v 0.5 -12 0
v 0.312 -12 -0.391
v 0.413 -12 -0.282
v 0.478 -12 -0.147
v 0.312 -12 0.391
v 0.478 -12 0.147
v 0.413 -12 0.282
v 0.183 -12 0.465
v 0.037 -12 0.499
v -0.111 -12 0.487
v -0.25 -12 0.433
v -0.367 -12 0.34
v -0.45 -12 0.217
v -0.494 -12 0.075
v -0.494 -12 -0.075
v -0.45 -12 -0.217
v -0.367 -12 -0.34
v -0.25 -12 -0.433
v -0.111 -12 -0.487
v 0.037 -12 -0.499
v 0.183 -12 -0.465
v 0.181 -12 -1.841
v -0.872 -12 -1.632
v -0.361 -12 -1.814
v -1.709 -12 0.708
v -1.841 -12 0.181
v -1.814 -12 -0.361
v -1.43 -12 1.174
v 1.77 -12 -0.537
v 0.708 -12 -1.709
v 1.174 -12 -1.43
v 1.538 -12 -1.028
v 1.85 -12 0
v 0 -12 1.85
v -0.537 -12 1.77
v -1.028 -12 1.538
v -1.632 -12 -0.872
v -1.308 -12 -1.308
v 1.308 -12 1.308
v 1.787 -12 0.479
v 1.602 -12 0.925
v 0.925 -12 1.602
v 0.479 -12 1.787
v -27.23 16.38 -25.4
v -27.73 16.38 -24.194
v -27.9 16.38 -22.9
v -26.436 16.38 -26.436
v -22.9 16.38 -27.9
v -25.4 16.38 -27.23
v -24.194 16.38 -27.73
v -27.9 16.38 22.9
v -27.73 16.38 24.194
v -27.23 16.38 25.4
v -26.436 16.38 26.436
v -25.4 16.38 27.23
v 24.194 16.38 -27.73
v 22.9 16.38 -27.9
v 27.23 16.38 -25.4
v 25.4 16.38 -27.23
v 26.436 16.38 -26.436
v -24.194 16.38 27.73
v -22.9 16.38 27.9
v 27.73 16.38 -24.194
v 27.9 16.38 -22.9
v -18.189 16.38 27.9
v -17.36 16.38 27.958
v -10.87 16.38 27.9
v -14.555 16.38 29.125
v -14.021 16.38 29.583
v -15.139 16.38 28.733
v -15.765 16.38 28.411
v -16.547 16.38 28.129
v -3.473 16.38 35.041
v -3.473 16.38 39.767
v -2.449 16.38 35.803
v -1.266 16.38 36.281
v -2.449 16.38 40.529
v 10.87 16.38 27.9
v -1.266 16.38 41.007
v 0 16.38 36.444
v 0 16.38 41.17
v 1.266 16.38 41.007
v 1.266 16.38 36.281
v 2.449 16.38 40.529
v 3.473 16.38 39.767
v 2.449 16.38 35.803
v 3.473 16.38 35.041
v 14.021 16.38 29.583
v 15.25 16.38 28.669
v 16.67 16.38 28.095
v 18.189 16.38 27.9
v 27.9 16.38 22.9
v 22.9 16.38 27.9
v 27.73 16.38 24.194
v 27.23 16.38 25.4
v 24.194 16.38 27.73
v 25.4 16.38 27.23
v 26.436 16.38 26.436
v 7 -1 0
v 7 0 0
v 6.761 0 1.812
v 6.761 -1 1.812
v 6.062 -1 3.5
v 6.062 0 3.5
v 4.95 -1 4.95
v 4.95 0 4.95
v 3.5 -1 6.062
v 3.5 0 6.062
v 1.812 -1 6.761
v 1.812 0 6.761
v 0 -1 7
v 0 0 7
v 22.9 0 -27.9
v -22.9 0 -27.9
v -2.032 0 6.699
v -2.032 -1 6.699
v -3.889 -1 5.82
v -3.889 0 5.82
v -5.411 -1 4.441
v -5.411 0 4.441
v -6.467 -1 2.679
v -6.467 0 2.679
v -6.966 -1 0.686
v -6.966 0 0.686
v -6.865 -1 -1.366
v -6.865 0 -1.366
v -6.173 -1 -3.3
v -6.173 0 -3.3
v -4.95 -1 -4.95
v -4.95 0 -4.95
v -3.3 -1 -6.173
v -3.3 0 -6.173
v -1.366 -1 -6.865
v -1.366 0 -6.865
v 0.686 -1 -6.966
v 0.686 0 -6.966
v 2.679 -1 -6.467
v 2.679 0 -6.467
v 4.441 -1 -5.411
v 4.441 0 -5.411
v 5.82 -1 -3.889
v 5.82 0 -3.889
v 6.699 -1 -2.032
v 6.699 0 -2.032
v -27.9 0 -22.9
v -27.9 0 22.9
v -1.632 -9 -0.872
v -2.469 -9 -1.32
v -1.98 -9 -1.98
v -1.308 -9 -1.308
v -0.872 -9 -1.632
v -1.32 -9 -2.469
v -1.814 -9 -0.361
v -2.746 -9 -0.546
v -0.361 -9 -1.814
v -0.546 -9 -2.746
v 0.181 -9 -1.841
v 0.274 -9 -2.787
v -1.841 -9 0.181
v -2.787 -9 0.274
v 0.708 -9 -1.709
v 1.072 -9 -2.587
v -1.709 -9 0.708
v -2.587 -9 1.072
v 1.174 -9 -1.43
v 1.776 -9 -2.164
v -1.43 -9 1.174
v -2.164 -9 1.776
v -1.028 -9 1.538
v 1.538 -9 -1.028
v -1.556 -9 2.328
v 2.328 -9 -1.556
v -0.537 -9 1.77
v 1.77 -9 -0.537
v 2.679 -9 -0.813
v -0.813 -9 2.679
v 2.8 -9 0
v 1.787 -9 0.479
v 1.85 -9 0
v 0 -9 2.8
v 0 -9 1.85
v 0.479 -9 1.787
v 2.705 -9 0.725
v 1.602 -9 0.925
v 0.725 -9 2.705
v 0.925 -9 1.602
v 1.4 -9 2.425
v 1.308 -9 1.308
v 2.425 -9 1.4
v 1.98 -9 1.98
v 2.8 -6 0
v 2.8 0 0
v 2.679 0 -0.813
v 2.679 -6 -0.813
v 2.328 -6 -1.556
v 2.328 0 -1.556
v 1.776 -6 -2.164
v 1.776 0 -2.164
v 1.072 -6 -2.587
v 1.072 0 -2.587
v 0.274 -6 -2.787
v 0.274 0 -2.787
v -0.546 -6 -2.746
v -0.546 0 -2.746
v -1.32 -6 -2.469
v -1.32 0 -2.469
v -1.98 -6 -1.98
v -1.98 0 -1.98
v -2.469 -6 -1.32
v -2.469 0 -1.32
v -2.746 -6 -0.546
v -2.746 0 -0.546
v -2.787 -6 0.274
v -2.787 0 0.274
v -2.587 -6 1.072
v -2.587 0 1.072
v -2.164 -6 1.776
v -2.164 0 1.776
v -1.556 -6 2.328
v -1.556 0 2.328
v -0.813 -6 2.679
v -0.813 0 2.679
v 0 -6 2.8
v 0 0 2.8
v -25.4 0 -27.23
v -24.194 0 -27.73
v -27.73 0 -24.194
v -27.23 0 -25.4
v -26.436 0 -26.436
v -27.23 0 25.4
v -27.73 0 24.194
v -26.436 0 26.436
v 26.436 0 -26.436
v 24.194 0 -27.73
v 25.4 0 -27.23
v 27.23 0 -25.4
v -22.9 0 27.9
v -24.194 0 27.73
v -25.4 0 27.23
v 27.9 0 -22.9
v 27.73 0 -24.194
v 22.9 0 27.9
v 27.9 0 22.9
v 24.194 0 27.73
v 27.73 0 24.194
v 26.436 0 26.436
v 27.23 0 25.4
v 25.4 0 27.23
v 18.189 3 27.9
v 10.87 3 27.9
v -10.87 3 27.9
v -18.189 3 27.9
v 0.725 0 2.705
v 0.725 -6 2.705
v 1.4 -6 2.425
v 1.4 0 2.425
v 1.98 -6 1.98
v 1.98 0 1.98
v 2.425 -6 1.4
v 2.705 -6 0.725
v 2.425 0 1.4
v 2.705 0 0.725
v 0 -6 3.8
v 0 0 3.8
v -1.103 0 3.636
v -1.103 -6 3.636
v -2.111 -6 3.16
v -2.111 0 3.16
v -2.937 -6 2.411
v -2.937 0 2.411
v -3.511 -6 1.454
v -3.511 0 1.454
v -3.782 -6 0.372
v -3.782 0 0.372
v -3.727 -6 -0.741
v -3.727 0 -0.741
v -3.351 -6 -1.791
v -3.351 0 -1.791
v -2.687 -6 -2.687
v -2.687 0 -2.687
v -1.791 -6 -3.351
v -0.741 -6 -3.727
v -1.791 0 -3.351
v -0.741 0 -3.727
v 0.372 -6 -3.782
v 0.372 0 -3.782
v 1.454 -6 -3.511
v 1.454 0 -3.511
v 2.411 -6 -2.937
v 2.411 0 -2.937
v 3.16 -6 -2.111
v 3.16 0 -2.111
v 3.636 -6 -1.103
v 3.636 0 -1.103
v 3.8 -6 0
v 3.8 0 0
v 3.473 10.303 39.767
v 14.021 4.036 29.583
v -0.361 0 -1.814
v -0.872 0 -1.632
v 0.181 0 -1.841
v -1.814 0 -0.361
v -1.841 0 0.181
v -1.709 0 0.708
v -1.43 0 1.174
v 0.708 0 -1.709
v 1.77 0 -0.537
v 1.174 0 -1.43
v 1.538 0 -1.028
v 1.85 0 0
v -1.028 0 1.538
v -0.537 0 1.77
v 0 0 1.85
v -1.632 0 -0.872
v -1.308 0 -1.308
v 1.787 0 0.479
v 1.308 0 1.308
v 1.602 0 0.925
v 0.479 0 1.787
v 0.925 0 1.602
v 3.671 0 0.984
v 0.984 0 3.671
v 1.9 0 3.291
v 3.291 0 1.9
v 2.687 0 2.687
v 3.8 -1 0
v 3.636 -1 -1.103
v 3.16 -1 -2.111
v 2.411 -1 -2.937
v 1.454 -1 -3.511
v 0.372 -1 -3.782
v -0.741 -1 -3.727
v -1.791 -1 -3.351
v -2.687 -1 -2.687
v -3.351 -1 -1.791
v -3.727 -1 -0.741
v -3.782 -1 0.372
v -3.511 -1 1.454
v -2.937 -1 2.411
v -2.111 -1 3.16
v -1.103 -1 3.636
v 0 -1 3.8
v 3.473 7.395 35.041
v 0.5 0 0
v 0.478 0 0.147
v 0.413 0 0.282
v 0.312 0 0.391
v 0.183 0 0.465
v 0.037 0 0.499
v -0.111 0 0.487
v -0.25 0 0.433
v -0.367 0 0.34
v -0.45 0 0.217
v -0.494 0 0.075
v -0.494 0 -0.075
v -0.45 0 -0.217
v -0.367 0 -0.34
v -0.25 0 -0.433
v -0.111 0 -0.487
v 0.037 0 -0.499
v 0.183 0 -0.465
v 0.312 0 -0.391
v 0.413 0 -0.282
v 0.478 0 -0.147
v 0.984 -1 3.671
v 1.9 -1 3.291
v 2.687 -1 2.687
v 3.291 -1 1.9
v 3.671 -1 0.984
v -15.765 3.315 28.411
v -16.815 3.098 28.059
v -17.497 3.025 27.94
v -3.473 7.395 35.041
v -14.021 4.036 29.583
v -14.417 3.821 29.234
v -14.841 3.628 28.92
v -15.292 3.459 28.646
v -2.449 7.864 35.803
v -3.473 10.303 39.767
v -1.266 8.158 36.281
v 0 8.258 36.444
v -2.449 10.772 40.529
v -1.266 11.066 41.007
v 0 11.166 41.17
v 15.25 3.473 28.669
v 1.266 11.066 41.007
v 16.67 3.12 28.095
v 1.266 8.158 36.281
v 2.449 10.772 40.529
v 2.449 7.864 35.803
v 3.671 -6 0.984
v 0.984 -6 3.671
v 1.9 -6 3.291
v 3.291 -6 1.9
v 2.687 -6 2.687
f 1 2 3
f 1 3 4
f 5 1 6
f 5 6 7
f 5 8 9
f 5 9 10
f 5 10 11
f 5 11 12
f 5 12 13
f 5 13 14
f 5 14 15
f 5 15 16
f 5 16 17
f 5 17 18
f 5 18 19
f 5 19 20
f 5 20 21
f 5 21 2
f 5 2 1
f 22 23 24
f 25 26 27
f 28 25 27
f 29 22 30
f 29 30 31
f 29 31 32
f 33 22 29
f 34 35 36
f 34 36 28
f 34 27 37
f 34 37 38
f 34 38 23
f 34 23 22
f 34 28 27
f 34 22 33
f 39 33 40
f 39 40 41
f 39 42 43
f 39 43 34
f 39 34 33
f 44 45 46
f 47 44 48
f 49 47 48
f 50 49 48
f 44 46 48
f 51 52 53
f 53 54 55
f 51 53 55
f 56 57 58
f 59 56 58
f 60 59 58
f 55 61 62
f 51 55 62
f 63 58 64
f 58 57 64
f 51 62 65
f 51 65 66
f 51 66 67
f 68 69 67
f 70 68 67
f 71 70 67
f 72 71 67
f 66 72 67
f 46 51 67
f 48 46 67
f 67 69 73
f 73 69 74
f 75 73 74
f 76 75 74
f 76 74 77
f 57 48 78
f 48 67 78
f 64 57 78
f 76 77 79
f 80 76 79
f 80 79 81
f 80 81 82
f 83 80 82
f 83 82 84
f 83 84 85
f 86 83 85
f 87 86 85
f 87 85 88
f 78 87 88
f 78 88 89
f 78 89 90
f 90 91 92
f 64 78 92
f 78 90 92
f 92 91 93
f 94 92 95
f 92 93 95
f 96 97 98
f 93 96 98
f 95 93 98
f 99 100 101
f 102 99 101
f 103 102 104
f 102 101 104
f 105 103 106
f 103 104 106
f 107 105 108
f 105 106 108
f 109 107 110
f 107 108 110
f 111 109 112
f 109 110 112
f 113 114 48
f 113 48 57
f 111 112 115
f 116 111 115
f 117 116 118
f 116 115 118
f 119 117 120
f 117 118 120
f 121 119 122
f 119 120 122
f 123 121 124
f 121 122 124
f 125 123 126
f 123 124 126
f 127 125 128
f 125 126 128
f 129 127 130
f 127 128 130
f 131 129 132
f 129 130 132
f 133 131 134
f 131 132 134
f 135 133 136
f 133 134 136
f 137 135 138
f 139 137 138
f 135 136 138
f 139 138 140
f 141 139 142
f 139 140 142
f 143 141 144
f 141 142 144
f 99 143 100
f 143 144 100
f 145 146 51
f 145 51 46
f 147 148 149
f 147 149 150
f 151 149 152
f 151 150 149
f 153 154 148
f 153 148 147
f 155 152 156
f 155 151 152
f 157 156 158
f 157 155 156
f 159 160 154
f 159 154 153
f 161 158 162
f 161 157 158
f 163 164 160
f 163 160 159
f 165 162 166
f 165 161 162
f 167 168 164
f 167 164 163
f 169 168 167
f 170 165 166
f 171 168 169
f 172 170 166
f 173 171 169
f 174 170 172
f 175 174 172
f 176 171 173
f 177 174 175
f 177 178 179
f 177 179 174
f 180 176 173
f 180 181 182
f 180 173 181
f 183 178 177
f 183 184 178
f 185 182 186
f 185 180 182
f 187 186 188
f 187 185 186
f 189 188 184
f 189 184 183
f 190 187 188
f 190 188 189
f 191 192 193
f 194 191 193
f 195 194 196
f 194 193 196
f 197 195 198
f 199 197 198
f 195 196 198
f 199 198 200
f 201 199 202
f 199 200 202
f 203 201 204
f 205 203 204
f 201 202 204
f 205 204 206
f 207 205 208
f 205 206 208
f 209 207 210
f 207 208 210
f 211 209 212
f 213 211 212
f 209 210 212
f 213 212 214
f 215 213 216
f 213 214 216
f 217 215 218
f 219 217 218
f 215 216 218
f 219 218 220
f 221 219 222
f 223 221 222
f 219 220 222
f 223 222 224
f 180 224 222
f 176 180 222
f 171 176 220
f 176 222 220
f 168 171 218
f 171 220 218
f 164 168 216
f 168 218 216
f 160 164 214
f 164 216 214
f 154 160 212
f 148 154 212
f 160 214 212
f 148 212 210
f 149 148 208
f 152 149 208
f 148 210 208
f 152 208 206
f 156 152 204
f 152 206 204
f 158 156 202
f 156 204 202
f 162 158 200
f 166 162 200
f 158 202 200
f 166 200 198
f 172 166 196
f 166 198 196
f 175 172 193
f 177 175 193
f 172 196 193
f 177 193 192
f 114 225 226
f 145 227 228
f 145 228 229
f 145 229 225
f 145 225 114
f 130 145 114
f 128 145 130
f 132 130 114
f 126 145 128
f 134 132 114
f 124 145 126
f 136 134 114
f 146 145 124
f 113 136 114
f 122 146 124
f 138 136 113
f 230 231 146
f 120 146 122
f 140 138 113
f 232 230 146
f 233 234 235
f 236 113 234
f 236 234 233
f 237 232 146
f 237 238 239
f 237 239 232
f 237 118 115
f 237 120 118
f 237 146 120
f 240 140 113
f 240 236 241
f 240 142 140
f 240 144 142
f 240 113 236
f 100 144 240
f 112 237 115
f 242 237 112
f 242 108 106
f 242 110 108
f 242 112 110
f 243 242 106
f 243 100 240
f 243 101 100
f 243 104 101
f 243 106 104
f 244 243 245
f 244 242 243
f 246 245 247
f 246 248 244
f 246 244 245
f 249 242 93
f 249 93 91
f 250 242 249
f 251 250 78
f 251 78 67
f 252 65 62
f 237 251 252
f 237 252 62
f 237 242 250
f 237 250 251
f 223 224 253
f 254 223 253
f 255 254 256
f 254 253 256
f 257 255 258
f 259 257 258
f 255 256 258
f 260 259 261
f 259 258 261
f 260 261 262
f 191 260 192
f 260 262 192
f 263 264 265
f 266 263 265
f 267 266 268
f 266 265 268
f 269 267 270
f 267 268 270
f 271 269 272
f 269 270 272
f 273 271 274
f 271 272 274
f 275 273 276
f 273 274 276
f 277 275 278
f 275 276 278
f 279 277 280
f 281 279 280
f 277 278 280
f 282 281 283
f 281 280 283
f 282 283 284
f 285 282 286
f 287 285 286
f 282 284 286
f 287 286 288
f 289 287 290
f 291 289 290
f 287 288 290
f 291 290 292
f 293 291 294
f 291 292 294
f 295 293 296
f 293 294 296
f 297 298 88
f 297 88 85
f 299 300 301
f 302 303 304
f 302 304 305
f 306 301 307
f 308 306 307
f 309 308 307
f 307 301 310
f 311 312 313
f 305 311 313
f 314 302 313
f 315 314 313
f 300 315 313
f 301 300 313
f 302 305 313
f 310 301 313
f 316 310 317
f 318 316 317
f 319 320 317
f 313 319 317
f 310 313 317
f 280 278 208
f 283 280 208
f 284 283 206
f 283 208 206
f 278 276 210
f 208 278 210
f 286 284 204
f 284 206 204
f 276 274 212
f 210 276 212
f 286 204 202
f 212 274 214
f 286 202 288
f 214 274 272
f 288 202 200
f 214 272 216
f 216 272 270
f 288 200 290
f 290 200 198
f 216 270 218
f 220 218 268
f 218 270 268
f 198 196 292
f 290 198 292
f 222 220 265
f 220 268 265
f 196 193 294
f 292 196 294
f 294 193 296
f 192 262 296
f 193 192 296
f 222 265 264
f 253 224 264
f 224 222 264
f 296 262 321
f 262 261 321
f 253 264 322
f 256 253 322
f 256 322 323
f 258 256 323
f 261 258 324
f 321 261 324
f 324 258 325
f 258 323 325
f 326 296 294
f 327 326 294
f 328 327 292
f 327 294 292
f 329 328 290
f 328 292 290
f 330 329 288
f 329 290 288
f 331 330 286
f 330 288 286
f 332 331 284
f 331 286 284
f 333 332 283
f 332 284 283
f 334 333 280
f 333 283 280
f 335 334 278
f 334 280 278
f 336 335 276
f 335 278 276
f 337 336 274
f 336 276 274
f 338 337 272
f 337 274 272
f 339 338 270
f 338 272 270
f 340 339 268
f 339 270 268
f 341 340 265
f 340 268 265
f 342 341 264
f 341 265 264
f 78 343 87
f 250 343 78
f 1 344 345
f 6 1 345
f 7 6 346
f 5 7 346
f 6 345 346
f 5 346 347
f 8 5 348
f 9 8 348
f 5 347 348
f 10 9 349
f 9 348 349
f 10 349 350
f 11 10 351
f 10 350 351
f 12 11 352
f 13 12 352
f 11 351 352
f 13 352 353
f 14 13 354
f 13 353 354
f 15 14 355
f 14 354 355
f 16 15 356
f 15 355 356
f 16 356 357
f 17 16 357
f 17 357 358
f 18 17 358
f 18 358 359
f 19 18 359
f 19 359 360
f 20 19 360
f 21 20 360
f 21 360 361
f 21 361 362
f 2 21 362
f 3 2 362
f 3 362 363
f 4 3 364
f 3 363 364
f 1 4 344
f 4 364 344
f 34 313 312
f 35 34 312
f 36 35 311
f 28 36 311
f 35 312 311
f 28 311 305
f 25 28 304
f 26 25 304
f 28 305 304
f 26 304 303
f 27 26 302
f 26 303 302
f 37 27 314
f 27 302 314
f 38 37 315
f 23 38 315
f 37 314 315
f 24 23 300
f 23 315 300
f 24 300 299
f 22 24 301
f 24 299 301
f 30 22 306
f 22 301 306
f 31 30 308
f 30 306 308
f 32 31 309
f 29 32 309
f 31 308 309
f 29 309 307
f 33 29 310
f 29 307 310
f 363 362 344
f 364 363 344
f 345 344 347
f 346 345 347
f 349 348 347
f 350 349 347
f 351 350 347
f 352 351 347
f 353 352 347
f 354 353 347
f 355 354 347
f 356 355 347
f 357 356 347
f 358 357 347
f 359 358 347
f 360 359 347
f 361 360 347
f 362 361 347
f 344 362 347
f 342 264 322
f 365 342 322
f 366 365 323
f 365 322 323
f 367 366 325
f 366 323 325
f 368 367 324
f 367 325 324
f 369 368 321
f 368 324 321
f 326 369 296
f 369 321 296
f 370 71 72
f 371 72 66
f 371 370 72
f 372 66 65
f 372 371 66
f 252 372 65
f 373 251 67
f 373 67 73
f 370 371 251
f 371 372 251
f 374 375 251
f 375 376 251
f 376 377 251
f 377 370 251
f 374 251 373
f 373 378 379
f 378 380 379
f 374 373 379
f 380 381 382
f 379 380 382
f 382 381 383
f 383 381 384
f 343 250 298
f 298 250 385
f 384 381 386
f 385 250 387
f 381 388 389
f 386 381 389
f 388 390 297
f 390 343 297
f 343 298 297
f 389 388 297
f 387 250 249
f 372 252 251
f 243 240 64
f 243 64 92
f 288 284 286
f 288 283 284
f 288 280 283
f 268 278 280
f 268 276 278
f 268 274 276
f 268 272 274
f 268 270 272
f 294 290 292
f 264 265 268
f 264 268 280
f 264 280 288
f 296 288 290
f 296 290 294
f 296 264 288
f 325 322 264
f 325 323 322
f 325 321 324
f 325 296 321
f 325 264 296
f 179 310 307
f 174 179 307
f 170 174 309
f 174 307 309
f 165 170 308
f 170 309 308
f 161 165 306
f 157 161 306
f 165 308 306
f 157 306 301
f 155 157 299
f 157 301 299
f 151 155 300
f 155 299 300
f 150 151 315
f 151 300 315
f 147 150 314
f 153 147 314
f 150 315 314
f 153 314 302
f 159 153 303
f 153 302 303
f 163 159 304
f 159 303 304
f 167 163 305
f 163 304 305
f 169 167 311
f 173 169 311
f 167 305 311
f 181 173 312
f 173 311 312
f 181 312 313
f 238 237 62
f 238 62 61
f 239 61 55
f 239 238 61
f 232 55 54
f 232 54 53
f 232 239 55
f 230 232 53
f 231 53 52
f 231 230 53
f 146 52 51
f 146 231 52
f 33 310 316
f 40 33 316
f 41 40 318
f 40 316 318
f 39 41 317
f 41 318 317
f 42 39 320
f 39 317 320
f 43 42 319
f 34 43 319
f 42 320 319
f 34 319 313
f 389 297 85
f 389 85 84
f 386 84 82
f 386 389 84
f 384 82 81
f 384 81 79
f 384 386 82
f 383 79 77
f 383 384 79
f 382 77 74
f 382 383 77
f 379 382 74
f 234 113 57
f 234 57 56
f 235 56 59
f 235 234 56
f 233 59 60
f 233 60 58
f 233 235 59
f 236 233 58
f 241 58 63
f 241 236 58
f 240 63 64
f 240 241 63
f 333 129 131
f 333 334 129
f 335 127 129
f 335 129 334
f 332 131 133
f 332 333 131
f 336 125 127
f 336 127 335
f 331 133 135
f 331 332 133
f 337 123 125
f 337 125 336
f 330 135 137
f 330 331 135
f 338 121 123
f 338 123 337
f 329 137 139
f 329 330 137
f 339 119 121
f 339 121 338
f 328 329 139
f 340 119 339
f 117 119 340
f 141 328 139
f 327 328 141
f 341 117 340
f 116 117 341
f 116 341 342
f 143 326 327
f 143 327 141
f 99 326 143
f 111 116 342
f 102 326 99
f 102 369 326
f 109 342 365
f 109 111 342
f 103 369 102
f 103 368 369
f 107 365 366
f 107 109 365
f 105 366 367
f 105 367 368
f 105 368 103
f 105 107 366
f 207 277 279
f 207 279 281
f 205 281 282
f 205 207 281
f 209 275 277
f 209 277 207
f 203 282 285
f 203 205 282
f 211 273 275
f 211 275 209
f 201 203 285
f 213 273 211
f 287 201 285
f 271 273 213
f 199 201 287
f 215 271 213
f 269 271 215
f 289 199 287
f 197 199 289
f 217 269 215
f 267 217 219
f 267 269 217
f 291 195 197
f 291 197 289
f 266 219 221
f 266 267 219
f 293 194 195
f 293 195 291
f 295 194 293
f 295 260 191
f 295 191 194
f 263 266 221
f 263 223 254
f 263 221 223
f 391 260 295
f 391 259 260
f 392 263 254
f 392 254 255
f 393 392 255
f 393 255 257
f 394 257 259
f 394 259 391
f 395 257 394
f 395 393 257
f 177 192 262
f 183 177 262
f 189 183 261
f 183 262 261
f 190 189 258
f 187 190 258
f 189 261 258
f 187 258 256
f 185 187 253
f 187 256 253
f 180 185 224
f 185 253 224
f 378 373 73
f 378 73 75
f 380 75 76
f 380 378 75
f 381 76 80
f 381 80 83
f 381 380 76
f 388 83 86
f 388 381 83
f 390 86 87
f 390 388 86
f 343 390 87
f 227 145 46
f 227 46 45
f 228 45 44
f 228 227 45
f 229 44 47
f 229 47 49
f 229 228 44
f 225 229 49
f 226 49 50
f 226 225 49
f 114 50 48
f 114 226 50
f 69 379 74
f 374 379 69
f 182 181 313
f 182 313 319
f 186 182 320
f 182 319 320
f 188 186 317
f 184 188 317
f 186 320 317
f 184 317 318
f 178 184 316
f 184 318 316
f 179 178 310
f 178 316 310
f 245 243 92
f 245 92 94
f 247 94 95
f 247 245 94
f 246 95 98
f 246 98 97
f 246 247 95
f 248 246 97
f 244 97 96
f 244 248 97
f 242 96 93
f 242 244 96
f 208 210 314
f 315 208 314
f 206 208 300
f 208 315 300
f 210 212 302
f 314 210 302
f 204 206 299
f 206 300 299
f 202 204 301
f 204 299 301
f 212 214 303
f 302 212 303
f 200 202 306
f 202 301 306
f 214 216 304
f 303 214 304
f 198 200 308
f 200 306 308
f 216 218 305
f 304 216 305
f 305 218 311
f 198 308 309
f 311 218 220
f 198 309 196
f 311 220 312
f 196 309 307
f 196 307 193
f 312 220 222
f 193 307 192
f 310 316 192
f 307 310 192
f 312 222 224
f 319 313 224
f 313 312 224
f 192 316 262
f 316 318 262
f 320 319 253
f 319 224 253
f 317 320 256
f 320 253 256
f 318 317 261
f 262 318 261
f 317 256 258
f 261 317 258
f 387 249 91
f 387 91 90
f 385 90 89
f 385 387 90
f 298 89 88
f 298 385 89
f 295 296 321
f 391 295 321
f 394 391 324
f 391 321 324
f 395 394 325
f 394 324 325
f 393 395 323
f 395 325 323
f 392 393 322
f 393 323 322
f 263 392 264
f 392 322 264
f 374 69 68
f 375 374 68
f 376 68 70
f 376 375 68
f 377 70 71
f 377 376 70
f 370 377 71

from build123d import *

# Parameters (mm, degrees)
F1_DEPTH  = 16.38
F4_DEPTH  = 55.801
F5_DEPTH  = 1
F6_DEPTH  = 6
F7_R      = 0.5
F8_DEPTH  = 12
F9_DEPTH  = 9
F10_DEPTH = 12


with BuildPart() as f1:
    # F0 (on Front) → F1 (new body)
    with BuildSketch(Plane.XZ):
        with BuildLine():
            Line((-22.9, -27.9), (22.9, -27.9))
            ThreePointArc((22.9, -27.9), (26.435534, -26.435534), (27.9, -22.9))
            Line((27.9, -22.9), (27.9, 22.9))
            ThreePointArc((27.9, 22.9), (26.435534, 26.435534), (22.9, 27.9))
            Line((22.9, 27.9), (18.18869, 27.9))
            ThreePointArc((18.18869, 27.9), (15.941423, 28.336746), (14.021318, 29.583403))
            Line((14.021318, 29.583403), (3.47281, 39.767246))
            ThreePointArc((3.47281, 39.767246), (0, 41.170082), (-3.47281, 39.767246))
            Line((-3.47281, 39.767246), (-14.021318, 29.583403))
            ThreePointArc((-14.021318, 29.583403), (-14.841456, 28.920439), (-15.765, 28.411309))
            ThreePointArc((-15.765, 28.411309), (-16.950172, 28.029219), (-18.18869, 27.9))
            Line((-18.18869, 27.9), (-22.9, 27.9))
            ThreePointArc((-22.9, 27.9), (-26.435534, 26.435534), (-27.9, 22.9))
            Line((-27.9, 22.9), (-27.9, -22.9))
            ThreePointArc((-27.9, -22.9), (-26.435534, -26.435534), (-22.9, -27.9))
        make_face()
        with BuildLine():
            ThreePointArc((0, 7), (4.949747, 4.949747), (7, 0))
            ThreePointArc((7, 0), (-4.949747, -4.949747), (0, 7))
        make_face(mode=Mode.SUBTRACT)
        with BuildLine():
            Line((10.869828, 27.9), (-10.869828, 27.9))
            Line((-10.869828, 27.9), (-3.47281, 35.041302))
            ThreePointArc((-3.47281, 35.041302), (0, 36.444137), (3.47281, 35.041302))
            Line((3.47281, 35.041302), (10.869828, 27.9))
        make_face(mode=Mode.SUBTRACT)
        with BuildLine():
            ThreePointArc((0, 7), (-4.949747, -4.949747), (7, 0))
            ThreePointArc((7, 0), (4.949747, 4.949747), (0, 7))
        make_face()
        with BuildLine():
            ThreePointArc((3.8, 0), (-2.687006, -2.687006), (0, 3.8))
            ThreePointArc((0, 3.8), (2.687006, 2.687006), (3.8, 0))
        make_face(mode=Mode.SUBTRACT)
        with BuildLine():
            ThreePointArc((3.8, 0), (2.687006, 2.687006), (0, 3.8))
            ThreePointArc((0, 3.8), (-2.687006, -2.687006), (3.8, 0))
        make_face()
        with BuildLine():
            ThreePointArc((2.8, 0), (-1.979899, -1.979899), (0, 2.8))
            ThreePointArc((0, 2.8), (1.979899, 1.979899), (2.8, 0))
        make_face(mode=Mode.SUBTRACT)
        with BuildLine():
            ThreePointArc((2.8, 0), (1.979899, 1.979899), (0, 2.8))
            ThreePointArc((0, 2.8), (-1.979899, -1.979899), (2.8, 0))
        make_face()
        with BuildLine():
            ThreePointArc((1.85, 0), (-1.308148, -1.308148), (0, 1.85))
            ThreePointArc((0, 1.85), (1.308148, 1.308148), (1.85, 0))
        make_face(mode=Mode.SUBTRACT)
        with BuildLine():
            ThreePointArc((1.85, 0), (1.308148, 1.308148), (0, 1.85))
            ThreePointArc((0, 1.85), (-1.308148, -1.308148), (1.85, 0))
        make_face()
    extrude(amount=-F1_DEPTH)

    # F3 (on offset) → F4 (cut, through all)
    with BuildSketch(Plane.YZ.offset(27.9)):
        Polygon((0, 44.834), (0, 27.9), (3, 27.9), (13.421, 44.834), align=None)
    extrude(amount=-F4_DEPTH, mode=Mode.SUBTRACT)

    # F0 (on Front) → F5 (join)
    with BuildSketch(Plane.XZ):
        with BuildLine():
            ThreePointArc((0, 7), (-4.949747, -4.949747), (7, 0))
            ThreePointArc((7, 0), (4.949747, 4.949747), (0, 7))
        make_face()
        with BuildLine():
            ThreePointArc((3.8, 0), (-2.687006, -2.687006), (0, 3.8))
            ThreePointArc((0, 3.8), (2.687006, 2.687006), (3.8, 0))
        make_face(mode=Mode.SUBTRACT)
    extrude(amount=F5_DEPTH)


with BuildPart() as f6:
    # F0 (on Front) → F6 (new body)
    with BuildSketch(Plane.XZ):
        with BuildLine():
            ThreePointArc((3.8, 0), (2.687006, 2.687006), (0, 3.8))
            ThreePointArc((0, 3.8), (-2.687006, -2.687006), (3.8, 0))
        make_face()
        with BuildLine():
            ThreePointArc((2.8, 0), (-1.979899, -1.979899), (0, 2.8))
            ThreePointArc((0, 2.8), (1.979899, 1.979899), (2.8, 0))
        make_face(mode=Mode.SUBTRACT)
    extrude(amount=F6_DEPTH)


with BuildPart() as f8:
    # F7 (on face) → F8 (new body)
    with BuildSketch(Plane.XZ):
        Circle(F7_R)
    extrude(amount=F8_DEPTH)


with BuildPart() as f9:
    # F0 (on Front) → F9 (new body)
    with BuildSketch(Plane.XZ):
        with BuildLine():
            ThreePointArc((2.8, 0), (1.979899, 1.979899), (0, 2.8))
            ThreePointArc((0, 2.8), (-1.979899, -1.979899), (2.8, 0))
        make_face()
        with BuildLine():
            ThreePointArc((1.85, 0), (-1.308148, -1.308148), (0, 1.85))
            ThreePointArc((0, 1.85), (1.308148, 1.308148), (1.85, 0))
        make_face(mode=Mode.SUBTRACT)
    extrude(amount=F9_DEPTH)


with BuildPart() as f10:
    # F0 (on Front) → F10 (new body)
    with BuildSketch(Plane.XZ):
        with BuildLine():
            ThreePointArc((1.85, 0), (1.308148, 1.308148), (0, 1.85))
            ThreePointArc((0, 1.85), (-1.308148, -1.308148), (1.85, 0))
        make_face()
    extrude(amount=F10_DEPTH)


solid = Compound([f1.part, f6.part, f8.part, f9.part, f10.part])
